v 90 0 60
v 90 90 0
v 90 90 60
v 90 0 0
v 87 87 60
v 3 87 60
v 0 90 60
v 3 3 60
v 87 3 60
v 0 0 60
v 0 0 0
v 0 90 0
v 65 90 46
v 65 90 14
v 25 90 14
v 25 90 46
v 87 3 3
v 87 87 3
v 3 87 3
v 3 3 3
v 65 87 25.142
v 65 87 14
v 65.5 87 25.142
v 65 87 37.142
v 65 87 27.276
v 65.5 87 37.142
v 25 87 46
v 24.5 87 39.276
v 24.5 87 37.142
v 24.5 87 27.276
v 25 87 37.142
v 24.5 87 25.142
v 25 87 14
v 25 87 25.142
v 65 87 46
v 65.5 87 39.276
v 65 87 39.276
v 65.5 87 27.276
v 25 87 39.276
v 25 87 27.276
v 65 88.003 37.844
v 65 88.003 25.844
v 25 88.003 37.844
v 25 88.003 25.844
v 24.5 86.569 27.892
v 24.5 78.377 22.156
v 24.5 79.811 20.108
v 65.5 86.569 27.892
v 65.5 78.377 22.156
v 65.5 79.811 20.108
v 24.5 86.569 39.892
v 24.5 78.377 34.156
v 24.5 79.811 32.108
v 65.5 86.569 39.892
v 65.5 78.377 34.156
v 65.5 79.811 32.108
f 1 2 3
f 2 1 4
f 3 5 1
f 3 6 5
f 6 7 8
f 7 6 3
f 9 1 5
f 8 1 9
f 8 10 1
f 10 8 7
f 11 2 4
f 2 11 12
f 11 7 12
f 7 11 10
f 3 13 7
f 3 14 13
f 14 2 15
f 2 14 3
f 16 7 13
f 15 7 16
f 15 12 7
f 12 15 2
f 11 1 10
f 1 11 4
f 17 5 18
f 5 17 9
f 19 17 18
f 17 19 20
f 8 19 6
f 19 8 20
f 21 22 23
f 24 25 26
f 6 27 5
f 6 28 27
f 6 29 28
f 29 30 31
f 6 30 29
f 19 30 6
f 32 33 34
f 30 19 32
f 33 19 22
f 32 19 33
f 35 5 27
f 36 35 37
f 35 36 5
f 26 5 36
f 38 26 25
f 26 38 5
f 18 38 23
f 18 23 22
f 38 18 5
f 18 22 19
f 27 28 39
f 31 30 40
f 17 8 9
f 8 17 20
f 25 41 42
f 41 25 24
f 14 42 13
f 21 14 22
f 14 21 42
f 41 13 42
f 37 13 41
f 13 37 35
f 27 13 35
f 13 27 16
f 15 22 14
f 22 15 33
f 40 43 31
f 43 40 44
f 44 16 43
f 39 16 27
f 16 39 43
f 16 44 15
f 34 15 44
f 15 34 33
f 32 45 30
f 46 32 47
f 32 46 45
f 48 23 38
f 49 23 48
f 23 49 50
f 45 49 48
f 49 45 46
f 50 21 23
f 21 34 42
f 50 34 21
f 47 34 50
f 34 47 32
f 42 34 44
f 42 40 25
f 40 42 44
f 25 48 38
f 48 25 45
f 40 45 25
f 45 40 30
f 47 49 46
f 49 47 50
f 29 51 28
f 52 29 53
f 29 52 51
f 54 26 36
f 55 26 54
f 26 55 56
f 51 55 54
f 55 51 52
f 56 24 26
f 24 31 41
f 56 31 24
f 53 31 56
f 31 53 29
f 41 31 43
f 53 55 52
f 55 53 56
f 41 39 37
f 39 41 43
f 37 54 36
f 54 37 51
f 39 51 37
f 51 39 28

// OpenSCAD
$fn = 32;

// ----------------------------------------------------------------------
// Vent box: louvers enclosure
// ----------------------------------------------------------------------

// --- parameters (mm) ---
box_l = 90;               // box length, X
box_w = 90;               // box width, Y
box_h = 60;               // box height, Z
wall_t = 3;               // shell wall thickness
win_l = 40;               // vent window width, X
win_h = 32;               // vent window height, Z
slat_t = 2.5;             // louver slat thickness
slat_d = 10;              // louver slat depth
slat_a = 35;              // louver slat angle, degrees
slat_pitch = 12;          // louver pitch
slat_yc = 83.19;          // slat centreline Y

win_z0 = (box_h - win_h) / 2;  // window lower edge Z
n_slats = 2;  // louver count
slat_z0 = win_z0 + (win_h - (n_slats - 1) * slat_pitch) / 2;

difference() {
  union() {
    difference() {
      cube([box_l, box_w, box_h]);
  translate([wall_t, wall_t, wall_t])
    cube([box_l - 2 * wall_t, box_w - 2 * wall_t, box_h]);
  translate([(box_l - win_l) / 2, box_w - wall_t - 1, win_z0])
    cube([win_l, wall_t + 2, win_h]);
    }
    for (i = [0 : n_slats - 1])
      translate([box_l / 2, slat_yc, slat_z0 + i * slat_pitch])
        rotate([slat_a, 0, 0])
          cube([win_l + 1, slat_d, slat_t], center = true);
  }
}
